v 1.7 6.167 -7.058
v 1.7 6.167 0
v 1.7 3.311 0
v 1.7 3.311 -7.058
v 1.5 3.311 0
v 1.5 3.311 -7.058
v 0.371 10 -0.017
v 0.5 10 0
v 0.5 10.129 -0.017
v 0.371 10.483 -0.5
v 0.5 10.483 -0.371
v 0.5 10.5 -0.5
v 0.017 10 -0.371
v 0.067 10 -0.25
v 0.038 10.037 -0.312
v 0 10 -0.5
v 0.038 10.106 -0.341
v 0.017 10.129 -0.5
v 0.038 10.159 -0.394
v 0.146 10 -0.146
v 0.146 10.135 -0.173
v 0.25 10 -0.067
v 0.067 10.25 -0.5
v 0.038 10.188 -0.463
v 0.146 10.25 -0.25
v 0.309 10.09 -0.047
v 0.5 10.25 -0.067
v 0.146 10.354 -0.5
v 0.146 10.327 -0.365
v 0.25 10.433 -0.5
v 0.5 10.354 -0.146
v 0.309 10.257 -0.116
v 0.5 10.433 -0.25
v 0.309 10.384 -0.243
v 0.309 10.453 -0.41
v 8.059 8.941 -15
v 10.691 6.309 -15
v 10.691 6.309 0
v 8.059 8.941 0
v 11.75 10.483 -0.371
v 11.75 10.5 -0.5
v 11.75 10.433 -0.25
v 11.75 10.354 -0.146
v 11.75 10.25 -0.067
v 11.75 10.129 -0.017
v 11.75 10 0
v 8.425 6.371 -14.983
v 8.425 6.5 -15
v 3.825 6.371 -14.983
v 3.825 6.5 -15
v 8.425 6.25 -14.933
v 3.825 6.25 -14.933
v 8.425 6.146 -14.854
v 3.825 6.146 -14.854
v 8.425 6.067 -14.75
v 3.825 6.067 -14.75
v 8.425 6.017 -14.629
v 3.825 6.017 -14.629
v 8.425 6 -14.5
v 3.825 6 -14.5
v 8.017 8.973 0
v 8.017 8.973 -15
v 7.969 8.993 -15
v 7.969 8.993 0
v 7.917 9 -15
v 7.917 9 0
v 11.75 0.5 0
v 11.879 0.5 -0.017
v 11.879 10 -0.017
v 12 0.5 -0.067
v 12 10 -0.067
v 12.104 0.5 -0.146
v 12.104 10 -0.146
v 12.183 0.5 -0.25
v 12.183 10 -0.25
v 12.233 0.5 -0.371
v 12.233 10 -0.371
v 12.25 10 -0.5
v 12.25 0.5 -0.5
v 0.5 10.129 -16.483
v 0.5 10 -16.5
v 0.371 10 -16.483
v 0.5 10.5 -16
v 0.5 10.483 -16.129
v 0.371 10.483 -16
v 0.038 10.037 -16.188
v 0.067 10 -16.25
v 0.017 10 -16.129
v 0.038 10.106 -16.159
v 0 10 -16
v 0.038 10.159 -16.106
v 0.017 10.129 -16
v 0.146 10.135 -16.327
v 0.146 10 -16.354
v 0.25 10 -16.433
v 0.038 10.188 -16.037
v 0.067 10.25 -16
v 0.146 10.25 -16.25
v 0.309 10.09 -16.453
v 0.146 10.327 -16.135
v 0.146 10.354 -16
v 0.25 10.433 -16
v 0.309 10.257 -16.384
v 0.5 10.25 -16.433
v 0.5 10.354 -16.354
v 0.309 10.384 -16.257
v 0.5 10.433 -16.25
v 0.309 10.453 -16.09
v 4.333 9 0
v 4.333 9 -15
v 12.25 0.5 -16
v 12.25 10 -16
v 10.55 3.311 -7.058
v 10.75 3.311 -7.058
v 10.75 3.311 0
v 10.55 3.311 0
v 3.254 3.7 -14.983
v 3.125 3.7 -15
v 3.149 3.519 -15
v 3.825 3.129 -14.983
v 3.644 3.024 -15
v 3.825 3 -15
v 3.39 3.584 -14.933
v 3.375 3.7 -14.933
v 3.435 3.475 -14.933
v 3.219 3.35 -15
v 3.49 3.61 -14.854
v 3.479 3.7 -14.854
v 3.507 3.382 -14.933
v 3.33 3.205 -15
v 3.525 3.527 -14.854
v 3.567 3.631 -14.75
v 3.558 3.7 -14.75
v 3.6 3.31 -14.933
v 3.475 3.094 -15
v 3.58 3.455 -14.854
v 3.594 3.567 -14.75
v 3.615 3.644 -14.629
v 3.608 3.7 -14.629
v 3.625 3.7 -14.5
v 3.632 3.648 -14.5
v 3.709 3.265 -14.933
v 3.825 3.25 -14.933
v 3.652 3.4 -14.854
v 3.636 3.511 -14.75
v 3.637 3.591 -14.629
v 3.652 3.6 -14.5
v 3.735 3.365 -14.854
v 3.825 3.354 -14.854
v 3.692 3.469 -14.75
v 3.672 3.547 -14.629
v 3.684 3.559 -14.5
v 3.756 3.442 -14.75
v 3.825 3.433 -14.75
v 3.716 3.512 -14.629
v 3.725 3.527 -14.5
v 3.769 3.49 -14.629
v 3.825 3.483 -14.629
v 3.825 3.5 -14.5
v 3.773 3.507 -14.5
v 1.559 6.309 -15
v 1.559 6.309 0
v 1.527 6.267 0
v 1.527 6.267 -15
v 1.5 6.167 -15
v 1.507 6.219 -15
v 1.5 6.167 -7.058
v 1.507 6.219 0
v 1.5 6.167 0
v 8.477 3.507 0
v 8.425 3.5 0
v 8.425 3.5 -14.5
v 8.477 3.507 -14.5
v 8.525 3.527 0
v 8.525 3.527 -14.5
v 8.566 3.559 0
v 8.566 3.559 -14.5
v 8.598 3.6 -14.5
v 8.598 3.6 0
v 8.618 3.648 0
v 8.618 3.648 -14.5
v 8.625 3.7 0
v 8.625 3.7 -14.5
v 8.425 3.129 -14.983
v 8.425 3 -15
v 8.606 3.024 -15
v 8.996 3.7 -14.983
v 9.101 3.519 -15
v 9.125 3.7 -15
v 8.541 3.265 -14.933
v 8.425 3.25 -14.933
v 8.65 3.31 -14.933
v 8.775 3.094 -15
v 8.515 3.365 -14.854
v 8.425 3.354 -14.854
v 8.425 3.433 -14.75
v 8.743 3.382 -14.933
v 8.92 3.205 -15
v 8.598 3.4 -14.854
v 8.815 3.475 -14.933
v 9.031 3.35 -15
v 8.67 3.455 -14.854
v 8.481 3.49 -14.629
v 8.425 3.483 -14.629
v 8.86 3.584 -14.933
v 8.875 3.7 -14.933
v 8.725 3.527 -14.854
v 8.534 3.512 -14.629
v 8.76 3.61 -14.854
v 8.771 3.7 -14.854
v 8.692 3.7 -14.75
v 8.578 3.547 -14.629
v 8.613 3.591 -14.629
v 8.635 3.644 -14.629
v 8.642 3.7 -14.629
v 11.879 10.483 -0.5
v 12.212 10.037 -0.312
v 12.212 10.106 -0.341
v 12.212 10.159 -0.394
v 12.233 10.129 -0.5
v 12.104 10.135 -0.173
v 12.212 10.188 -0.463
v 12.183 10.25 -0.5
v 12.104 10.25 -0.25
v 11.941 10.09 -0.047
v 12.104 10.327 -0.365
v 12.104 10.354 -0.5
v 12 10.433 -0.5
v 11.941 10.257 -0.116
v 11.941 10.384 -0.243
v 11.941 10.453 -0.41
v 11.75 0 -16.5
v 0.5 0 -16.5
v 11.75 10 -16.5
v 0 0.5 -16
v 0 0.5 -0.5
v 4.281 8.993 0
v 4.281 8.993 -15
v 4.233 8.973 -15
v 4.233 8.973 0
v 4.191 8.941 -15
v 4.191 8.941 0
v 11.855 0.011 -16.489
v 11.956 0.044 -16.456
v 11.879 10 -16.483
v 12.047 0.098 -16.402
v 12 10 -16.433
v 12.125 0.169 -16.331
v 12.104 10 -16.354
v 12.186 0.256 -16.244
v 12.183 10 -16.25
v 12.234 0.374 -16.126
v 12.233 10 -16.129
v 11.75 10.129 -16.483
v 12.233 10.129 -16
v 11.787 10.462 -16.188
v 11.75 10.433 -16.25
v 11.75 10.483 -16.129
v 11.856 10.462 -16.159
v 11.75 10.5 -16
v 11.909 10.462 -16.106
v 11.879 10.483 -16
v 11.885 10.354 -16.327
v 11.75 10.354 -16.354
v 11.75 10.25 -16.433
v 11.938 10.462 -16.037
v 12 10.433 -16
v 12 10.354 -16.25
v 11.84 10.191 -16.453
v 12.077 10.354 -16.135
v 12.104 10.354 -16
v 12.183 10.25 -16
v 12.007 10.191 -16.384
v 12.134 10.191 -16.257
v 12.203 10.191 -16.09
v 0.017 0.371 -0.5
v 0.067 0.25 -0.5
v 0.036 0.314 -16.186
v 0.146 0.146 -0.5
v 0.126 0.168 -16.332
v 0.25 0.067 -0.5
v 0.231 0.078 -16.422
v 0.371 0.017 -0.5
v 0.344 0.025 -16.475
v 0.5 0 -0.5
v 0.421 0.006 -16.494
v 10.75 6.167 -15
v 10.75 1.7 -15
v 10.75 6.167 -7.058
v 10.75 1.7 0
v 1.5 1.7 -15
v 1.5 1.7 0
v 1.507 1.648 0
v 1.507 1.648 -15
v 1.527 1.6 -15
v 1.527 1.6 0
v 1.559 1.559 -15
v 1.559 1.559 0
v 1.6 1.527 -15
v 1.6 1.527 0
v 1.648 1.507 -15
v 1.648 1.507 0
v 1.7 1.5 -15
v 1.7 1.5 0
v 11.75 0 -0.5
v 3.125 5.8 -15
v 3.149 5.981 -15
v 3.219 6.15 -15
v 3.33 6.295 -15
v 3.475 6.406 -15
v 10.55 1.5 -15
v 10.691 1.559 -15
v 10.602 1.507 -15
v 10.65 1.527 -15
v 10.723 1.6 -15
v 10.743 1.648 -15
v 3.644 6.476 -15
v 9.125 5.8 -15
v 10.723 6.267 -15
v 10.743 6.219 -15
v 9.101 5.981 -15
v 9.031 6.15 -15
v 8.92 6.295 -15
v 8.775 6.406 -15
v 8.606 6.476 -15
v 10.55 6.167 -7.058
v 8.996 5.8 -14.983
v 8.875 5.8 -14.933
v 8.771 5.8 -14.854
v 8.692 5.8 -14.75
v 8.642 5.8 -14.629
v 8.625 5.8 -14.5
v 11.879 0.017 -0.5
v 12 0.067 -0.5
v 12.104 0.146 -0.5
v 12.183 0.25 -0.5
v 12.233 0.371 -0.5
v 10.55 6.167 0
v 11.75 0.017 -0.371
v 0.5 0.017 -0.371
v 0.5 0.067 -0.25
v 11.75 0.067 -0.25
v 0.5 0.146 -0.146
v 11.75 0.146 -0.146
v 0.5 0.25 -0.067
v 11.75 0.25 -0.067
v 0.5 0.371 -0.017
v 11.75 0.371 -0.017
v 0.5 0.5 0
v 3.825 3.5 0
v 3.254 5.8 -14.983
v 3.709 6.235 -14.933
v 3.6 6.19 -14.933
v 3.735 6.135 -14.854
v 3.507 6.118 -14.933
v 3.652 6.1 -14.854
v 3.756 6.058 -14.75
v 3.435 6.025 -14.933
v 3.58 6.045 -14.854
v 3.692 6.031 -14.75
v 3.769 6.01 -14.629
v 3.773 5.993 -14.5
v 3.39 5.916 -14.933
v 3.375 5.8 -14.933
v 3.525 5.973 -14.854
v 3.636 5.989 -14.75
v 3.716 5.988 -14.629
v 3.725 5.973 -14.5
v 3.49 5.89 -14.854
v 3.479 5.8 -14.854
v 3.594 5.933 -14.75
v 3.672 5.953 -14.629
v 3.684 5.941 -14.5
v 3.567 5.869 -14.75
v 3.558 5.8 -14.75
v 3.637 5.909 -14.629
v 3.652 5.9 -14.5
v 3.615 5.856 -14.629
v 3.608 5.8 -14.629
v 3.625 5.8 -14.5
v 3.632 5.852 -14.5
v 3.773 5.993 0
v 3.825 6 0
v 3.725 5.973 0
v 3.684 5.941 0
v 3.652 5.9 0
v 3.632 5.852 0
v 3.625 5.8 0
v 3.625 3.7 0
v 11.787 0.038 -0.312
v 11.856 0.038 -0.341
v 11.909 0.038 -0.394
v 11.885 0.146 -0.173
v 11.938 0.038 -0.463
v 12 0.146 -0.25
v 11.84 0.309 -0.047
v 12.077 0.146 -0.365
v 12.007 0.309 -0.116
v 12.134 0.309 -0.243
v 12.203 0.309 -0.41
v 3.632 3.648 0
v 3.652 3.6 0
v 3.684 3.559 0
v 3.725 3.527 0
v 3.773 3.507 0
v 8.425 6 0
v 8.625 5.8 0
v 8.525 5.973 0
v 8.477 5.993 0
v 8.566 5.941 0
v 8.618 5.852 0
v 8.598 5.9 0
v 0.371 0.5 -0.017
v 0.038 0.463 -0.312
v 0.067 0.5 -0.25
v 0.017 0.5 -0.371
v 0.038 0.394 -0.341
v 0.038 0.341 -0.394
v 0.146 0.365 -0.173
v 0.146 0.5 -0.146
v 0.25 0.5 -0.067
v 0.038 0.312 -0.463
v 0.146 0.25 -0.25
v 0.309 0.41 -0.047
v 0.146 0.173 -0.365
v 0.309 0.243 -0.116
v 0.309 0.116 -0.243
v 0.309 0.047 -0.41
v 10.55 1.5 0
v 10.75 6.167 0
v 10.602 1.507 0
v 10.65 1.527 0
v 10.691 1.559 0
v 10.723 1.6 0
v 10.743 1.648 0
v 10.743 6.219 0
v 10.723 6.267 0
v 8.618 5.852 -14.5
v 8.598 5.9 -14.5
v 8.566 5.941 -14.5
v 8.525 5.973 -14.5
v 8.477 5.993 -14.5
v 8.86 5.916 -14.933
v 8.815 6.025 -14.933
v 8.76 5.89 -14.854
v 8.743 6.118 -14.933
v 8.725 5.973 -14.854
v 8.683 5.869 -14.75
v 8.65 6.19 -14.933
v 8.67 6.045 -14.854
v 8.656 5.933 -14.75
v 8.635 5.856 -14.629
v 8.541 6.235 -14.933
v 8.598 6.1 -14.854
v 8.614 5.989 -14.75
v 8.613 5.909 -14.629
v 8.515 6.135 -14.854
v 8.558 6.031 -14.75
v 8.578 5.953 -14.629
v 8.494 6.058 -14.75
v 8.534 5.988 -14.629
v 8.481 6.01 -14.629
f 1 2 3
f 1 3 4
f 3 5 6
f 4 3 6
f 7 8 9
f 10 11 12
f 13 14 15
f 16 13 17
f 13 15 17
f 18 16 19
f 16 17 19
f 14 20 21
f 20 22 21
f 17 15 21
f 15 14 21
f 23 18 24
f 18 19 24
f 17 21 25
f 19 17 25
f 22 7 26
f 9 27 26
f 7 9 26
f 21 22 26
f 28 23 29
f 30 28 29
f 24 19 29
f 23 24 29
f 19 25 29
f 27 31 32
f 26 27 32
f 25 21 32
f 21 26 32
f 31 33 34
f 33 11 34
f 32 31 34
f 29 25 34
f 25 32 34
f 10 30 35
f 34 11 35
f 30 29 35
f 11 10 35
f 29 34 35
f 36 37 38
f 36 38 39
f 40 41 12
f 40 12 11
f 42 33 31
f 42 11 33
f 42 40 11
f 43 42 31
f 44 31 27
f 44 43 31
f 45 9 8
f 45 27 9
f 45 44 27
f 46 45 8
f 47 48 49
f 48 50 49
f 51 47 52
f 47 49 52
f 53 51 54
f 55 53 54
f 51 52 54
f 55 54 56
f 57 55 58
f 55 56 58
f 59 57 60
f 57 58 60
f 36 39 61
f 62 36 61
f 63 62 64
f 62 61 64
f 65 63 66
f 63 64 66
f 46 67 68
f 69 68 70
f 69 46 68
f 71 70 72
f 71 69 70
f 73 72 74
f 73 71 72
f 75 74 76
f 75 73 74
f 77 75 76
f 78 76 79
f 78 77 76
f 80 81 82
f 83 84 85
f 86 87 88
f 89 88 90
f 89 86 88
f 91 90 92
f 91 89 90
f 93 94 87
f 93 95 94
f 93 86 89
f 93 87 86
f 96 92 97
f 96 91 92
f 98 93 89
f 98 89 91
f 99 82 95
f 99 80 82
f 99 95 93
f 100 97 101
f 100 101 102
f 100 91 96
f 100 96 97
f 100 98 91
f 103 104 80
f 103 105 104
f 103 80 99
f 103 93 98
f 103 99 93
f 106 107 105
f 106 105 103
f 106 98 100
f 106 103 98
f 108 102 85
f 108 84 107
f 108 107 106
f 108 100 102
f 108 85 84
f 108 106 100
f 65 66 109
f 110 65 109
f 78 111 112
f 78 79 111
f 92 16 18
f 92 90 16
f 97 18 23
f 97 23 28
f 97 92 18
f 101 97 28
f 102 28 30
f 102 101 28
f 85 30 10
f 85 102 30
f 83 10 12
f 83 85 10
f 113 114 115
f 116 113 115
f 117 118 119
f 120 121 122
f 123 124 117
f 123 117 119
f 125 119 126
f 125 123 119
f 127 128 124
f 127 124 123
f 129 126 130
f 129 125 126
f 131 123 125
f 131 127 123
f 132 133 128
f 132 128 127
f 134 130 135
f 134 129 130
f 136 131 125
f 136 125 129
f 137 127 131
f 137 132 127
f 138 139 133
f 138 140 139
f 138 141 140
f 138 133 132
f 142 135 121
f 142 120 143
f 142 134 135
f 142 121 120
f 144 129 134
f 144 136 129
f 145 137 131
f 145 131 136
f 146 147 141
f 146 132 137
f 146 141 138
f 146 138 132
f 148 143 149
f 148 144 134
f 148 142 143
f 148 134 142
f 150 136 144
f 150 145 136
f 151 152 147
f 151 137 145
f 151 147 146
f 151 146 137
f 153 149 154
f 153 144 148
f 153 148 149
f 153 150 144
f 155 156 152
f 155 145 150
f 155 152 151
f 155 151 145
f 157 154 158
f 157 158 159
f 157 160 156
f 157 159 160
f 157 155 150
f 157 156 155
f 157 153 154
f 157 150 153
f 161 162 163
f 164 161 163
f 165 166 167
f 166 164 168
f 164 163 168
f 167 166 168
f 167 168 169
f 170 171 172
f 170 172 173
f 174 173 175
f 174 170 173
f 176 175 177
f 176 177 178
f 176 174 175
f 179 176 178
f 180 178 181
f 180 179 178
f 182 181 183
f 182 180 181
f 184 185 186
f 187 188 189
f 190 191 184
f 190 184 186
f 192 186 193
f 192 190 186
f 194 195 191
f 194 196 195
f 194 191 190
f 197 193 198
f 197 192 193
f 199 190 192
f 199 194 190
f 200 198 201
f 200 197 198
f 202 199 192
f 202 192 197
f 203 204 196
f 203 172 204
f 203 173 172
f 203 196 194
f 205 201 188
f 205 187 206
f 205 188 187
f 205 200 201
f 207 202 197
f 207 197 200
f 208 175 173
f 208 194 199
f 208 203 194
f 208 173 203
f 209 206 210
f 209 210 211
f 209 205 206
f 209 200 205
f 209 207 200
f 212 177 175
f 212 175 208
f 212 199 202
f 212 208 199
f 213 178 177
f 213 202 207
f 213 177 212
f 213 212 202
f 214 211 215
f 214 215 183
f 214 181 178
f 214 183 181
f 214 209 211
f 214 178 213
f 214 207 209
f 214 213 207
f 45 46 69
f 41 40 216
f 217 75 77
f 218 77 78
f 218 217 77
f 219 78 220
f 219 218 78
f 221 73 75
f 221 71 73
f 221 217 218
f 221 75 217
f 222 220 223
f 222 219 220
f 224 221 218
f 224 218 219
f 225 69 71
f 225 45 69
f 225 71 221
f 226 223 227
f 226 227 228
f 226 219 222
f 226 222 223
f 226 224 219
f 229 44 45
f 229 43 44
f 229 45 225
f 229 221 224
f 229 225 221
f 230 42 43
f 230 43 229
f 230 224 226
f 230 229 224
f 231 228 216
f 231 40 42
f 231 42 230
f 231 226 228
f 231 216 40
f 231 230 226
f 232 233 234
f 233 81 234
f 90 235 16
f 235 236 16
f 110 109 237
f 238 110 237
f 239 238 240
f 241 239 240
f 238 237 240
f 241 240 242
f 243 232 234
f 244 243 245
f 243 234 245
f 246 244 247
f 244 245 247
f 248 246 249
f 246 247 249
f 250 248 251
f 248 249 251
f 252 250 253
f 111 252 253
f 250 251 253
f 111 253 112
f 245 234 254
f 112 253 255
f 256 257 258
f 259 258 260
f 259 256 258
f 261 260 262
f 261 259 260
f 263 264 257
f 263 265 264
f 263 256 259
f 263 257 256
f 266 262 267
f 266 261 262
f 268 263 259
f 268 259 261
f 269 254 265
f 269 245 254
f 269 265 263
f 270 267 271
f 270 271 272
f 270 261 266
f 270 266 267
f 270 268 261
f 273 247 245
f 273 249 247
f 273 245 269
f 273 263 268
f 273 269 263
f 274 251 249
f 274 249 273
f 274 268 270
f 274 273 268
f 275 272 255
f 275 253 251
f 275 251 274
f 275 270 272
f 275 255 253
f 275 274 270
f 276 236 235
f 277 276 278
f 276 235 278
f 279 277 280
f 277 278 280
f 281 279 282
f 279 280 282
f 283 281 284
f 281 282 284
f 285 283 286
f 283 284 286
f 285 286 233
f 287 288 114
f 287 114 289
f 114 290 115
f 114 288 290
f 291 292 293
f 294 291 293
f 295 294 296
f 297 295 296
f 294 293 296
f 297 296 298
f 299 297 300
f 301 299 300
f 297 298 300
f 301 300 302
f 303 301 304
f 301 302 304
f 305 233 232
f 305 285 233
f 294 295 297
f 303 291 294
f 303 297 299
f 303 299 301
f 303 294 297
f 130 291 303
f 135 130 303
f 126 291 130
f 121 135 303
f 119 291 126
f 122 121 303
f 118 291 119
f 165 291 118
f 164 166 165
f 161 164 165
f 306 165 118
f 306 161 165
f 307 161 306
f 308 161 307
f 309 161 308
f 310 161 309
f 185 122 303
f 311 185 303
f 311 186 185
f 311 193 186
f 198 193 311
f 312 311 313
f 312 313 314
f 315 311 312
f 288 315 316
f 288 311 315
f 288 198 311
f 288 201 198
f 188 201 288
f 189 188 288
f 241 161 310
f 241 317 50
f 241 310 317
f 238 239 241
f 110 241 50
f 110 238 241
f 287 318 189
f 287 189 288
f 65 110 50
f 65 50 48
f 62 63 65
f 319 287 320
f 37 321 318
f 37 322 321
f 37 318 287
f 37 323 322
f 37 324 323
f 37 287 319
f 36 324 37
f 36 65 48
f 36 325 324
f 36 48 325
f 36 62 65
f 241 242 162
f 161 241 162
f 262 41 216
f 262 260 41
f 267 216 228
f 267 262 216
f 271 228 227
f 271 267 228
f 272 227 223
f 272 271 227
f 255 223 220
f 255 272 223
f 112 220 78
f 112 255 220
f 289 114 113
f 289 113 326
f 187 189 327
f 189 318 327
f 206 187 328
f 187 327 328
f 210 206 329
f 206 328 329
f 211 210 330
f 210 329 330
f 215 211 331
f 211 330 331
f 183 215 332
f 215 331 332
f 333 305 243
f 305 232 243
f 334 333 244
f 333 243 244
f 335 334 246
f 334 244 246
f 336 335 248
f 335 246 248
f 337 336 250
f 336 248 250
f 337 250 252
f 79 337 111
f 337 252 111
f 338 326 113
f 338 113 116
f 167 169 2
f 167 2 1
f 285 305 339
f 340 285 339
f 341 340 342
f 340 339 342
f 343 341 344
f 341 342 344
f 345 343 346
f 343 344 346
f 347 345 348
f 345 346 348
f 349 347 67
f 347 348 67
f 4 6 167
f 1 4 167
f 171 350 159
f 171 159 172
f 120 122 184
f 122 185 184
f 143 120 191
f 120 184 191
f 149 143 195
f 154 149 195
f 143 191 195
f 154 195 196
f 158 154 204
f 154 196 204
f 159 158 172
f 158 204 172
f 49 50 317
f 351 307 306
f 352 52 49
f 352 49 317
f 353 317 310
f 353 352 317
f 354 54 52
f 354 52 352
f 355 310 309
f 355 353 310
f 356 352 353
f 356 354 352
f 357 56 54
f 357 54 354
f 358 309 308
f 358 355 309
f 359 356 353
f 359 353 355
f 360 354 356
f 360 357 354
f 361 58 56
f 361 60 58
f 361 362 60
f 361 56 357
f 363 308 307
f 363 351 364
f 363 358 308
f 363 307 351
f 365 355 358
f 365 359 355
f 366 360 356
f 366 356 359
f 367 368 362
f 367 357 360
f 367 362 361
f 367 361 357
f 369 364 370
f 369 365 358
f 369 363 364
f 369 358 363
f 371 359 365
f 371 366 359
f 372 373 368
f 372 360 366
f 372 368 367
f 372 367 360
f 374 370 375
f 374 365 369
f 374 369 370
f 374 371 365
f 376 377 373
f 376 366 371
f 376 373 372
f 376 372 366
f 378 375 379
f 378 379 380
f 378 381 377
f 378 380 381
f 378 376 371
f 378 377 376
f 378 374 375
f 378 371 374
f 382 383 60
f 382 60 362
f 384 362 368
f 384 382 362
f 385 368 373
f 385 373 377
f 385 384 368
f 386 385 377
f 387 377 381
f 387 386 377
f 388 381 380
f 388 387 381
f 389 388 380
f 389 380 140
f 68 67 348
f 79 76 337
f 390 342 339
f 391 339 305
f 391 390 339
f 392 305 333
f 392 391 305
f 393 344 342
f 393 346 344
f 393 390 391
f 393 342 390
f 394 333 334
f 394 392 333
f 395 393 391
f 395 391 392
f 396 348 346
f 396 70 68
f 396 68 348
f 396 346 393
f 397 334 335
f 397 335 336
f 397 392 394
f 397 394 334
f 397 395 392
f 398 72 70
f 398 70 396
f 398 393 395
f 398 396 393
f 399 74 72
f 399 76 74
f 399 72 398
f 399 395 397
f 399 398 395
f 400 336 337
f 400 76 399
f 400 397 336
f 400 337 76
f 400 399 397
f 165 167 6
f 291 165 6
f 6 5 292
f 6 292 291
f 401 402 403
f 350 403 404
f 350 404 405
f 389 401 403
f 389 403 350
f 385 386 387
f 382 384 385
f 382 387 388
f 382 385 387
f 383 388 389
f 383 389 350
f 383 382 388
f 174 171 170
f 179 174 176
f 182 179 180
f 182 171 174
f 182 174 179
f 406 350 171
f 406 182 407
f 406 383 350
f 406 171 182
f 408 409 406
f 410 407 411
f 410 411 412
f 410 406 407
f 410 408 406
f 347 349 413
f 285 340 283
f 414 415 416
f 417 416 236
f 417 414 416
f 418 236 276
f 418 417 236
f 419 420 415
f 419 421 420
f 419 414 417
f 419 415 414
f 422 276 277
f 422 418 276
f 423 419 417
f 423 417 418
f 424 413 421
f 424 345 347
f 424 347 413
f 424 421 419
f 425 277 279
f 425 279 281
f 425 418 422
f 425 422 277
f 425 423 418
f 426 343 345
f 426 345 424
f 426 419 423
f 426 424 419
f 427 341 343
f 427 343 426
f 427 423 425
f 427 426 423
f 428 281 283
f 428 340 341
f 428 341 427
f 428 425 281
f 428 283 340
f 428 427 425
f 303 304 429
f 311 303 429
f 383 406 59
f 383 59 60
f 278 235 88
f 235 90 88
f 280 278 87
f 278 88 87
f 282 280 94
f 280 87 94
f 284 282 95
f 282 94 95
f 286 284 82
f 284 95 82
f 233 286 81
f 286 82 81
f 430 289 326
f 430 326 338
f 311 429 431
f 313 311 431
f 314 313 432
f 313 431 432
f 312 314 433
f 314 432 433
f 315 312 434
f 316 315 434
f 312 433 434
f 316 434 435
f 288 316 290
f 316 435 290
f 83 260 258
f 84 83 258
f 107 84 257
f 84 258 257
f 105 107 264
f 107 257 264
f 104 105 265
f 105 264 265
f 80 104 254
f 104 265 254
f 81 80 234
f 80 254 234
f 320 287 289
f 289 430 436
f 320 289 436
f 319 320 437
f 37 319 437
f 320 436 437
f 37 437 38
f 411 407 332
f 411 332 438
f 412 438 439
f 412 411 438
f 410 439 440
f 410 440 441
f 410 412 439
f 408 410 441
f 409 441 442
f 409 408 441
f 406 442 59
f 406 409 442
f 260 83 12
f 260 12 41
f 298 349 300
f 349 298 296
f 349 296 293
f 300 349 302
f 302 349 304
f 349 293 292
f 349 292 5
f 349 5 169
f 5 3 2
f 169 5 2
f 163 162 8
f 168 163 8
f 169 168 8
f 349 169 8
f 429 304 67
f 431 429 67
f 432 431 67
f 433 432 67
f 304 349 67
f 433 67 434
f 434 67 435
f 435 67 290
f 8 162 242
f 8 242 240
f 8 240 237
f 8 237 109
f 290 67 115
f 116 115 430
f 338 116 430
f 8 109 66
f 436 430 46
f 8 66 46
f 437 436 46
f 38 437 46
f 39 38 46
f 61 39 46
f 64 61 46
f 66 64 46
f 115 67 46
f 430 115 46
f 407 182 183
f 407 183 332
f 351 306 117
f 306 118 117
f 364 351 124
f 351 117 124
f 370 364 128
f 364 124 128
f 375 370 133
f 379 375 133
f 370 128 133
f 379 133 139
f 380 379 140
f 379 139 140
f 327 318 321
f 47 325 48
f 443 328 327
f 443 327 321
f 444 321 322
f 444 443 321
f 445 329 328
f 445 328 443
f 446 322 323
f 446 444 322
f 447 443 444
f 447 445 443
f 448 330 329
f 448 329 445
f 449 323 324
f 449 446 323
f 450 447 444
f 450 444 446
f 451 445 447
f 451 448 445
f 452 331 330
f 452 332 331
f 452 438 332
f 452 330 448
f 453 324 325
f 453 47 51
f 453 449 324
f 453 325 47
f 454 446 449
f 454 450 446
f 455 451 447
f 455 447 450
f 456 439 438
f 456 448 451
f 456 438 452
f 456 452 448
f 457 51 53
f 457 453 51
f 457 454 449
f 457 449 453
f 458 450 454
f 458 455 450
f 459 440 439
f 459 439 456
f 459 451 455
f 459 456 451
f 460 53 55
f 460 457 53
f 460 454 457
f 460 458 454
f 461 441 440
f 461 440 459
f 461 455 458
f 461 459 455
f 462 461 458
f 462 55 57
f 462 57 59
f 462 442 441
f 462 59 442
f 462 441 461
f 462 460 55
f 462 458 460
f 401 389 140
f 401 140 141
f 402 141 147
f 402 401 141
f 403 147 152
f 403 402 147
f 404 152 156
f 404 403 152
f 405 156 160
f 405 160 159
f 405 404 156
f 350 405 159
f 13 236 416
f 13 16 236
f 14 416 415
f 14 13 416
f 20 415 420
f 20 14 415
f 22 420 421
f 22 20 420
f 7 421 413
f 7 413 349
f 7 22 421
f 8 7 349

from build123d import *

# Parameters (mm, degrees)
SKETCH1_W           = 12.25
SKETCH1_H           = 10.5
BOSS_EXTRUDE1_DEPTH = 16.5
CUT_EXTRUDE1_DEPTH  = 15
FILLET1_R           = 0.5
SKETCH8_W           = 7.057916012
SKETCH8_H           = 2.856354625
BOSS_EXTRUDE3_DEPTH = 0.2
SKETCH4_W           = 7.057916012
SKETCH4_H           = 2.856354625
BOSS_EXTRUDE4_DEPTH = 0.2


with BuildPart() as part:
    # Sketch1 → Boss-Extrude1 (new body)
    with BuildSketch(Plane.XY):
        with Locations((6.125, 5.25)):
            Rectangle(SKETCH1_W, SKETCH1_H)
    extrude(amount=-BOSS_EXTRUDE1_DEPTH)

    # Sketch3 → Cut-Extrude1 (cut)
    with BuildSketch(Plane.XY):
        with BuildLine():
            Line((1.5, 6.167157288), (1.5, 1.7))
            ThreePointArc((1.5, 1.7), (1.558578644, 1.558578644), (1.7, 1.5))
            Line((1.7, 1.5), (10.55, 1.5))
            ThreePointArc((10.55, 1.5), (10.691421356, 1.558578644), (10.75, 1.7))
            Line((10.75, 1.7), (10.75, 6.167157288))
            ThreePointArc((10.75, 6.167157288), (10.734775907, 6.243693974), (10.691421356, 6.308578644))
            Line((10.691421356, 6.308578644), (8.058578644, 8.941421356))
            ThreePointArc((8.058578644, 8.941421356), (7.993693974, 8.984775907), (7.917157288, 9))
            Line((7.917157288, 9), (4.332842712, 9))
            ThreePointArc((4.332842712, 9), (4.256306026, 8.984775907), (4.191421356, 8.941421356))
            Line((4.191421356, 8.941421356), (1.558578644, 6.308578644))
            ThreePointArc((1.558578644, 6.308578644), (1.515224093, 6.243693974), (1.5, 6.167157288))
        make_face()
        with BuildLine():
            ThreePointArc((3.825, 6), (3.683578644, 5.941421356), (3.625, 5.8))
            Line((3.625, 5.8), (3.625, 3.7))
            ThreePointArc((3.625, 3.7), (3.683578644, 3.558578644), (3.825, 3.5))
            Line((3.825, 3.5), (8.425, 3.5))
            ThreePointArc((8.425, 3.5), (8.566421356, 3.558578644), (8.625, 3.7))
            Line((8.625, 3.7), (8.625, 5.8))
            ThreePointArc((8.625, 5.8), (8.566421356, 5.941421356), (8.425, 6))
            Line((8.425, 6), (3.825, 6))
        make_face(mode=Mode.SUBTRACT)
    extrude(amount=-CUT_EXTRUDE1_DEPTH, mode=Mode.SUBTRACT)

    # Fillet1
    fillet1_edges = [part.edges().sort_by_distance(p)[0] for p in [
        (12.25, 5.25, -16.5),
        (6.125, 10.5, -16.5),
        (8.625, 4.75, -15),
        (8.566421356, 5.941421356, -15),
        (6.125, 6, -15),
        (3.683578644, 5.941421356, -15),
        (3.625, 4.75, -15),
        (3.683578644, 3.558578644, -15),
        (6.125, 3.5, -15),
        (8.566421356, 3.558578644, -15),
        (0, 5.25, -16.5),
        (6.125, 10.5, 0),
        (12.25, 5.25, 0),
        (6.125, 0, 0),
        (0, 5.25, 0),
        (0, 10.5, -8.25),
        (12.25, 10.5, -8.25),
        (12.25, 0, -8.25),
        (0, 0, -8.25),
    ]]
    fillet(fillet1_edges, radius=FILLET1_R)

    # Sketch8 → Boss-Extrude3 (add)
    with BuildSketch(Plane(origin=(1.5, 0, 0), x_dir=(0, 0, -1), z_dir=(1, 0, 0))):
        with Locations((3.528958006, 4.738979976)):
            Rectangle(SKETCH8_W, SKETCH8_H)
    extrude(amount=BOSS_EXTRUDE3_DEPTH)

    # Sketch4 → Boss-Extrude4 (add)
    with BuildSketch(Plane.ZY.offset(-10.75)):
        with Locations((-3.528958006, 4.738979976)):
            Rectangle(SKETCH4_W, SKETCH4_H)
    extrude(amount=BOSS_EXTRUDE4_DEPTH)


solid = part.part
